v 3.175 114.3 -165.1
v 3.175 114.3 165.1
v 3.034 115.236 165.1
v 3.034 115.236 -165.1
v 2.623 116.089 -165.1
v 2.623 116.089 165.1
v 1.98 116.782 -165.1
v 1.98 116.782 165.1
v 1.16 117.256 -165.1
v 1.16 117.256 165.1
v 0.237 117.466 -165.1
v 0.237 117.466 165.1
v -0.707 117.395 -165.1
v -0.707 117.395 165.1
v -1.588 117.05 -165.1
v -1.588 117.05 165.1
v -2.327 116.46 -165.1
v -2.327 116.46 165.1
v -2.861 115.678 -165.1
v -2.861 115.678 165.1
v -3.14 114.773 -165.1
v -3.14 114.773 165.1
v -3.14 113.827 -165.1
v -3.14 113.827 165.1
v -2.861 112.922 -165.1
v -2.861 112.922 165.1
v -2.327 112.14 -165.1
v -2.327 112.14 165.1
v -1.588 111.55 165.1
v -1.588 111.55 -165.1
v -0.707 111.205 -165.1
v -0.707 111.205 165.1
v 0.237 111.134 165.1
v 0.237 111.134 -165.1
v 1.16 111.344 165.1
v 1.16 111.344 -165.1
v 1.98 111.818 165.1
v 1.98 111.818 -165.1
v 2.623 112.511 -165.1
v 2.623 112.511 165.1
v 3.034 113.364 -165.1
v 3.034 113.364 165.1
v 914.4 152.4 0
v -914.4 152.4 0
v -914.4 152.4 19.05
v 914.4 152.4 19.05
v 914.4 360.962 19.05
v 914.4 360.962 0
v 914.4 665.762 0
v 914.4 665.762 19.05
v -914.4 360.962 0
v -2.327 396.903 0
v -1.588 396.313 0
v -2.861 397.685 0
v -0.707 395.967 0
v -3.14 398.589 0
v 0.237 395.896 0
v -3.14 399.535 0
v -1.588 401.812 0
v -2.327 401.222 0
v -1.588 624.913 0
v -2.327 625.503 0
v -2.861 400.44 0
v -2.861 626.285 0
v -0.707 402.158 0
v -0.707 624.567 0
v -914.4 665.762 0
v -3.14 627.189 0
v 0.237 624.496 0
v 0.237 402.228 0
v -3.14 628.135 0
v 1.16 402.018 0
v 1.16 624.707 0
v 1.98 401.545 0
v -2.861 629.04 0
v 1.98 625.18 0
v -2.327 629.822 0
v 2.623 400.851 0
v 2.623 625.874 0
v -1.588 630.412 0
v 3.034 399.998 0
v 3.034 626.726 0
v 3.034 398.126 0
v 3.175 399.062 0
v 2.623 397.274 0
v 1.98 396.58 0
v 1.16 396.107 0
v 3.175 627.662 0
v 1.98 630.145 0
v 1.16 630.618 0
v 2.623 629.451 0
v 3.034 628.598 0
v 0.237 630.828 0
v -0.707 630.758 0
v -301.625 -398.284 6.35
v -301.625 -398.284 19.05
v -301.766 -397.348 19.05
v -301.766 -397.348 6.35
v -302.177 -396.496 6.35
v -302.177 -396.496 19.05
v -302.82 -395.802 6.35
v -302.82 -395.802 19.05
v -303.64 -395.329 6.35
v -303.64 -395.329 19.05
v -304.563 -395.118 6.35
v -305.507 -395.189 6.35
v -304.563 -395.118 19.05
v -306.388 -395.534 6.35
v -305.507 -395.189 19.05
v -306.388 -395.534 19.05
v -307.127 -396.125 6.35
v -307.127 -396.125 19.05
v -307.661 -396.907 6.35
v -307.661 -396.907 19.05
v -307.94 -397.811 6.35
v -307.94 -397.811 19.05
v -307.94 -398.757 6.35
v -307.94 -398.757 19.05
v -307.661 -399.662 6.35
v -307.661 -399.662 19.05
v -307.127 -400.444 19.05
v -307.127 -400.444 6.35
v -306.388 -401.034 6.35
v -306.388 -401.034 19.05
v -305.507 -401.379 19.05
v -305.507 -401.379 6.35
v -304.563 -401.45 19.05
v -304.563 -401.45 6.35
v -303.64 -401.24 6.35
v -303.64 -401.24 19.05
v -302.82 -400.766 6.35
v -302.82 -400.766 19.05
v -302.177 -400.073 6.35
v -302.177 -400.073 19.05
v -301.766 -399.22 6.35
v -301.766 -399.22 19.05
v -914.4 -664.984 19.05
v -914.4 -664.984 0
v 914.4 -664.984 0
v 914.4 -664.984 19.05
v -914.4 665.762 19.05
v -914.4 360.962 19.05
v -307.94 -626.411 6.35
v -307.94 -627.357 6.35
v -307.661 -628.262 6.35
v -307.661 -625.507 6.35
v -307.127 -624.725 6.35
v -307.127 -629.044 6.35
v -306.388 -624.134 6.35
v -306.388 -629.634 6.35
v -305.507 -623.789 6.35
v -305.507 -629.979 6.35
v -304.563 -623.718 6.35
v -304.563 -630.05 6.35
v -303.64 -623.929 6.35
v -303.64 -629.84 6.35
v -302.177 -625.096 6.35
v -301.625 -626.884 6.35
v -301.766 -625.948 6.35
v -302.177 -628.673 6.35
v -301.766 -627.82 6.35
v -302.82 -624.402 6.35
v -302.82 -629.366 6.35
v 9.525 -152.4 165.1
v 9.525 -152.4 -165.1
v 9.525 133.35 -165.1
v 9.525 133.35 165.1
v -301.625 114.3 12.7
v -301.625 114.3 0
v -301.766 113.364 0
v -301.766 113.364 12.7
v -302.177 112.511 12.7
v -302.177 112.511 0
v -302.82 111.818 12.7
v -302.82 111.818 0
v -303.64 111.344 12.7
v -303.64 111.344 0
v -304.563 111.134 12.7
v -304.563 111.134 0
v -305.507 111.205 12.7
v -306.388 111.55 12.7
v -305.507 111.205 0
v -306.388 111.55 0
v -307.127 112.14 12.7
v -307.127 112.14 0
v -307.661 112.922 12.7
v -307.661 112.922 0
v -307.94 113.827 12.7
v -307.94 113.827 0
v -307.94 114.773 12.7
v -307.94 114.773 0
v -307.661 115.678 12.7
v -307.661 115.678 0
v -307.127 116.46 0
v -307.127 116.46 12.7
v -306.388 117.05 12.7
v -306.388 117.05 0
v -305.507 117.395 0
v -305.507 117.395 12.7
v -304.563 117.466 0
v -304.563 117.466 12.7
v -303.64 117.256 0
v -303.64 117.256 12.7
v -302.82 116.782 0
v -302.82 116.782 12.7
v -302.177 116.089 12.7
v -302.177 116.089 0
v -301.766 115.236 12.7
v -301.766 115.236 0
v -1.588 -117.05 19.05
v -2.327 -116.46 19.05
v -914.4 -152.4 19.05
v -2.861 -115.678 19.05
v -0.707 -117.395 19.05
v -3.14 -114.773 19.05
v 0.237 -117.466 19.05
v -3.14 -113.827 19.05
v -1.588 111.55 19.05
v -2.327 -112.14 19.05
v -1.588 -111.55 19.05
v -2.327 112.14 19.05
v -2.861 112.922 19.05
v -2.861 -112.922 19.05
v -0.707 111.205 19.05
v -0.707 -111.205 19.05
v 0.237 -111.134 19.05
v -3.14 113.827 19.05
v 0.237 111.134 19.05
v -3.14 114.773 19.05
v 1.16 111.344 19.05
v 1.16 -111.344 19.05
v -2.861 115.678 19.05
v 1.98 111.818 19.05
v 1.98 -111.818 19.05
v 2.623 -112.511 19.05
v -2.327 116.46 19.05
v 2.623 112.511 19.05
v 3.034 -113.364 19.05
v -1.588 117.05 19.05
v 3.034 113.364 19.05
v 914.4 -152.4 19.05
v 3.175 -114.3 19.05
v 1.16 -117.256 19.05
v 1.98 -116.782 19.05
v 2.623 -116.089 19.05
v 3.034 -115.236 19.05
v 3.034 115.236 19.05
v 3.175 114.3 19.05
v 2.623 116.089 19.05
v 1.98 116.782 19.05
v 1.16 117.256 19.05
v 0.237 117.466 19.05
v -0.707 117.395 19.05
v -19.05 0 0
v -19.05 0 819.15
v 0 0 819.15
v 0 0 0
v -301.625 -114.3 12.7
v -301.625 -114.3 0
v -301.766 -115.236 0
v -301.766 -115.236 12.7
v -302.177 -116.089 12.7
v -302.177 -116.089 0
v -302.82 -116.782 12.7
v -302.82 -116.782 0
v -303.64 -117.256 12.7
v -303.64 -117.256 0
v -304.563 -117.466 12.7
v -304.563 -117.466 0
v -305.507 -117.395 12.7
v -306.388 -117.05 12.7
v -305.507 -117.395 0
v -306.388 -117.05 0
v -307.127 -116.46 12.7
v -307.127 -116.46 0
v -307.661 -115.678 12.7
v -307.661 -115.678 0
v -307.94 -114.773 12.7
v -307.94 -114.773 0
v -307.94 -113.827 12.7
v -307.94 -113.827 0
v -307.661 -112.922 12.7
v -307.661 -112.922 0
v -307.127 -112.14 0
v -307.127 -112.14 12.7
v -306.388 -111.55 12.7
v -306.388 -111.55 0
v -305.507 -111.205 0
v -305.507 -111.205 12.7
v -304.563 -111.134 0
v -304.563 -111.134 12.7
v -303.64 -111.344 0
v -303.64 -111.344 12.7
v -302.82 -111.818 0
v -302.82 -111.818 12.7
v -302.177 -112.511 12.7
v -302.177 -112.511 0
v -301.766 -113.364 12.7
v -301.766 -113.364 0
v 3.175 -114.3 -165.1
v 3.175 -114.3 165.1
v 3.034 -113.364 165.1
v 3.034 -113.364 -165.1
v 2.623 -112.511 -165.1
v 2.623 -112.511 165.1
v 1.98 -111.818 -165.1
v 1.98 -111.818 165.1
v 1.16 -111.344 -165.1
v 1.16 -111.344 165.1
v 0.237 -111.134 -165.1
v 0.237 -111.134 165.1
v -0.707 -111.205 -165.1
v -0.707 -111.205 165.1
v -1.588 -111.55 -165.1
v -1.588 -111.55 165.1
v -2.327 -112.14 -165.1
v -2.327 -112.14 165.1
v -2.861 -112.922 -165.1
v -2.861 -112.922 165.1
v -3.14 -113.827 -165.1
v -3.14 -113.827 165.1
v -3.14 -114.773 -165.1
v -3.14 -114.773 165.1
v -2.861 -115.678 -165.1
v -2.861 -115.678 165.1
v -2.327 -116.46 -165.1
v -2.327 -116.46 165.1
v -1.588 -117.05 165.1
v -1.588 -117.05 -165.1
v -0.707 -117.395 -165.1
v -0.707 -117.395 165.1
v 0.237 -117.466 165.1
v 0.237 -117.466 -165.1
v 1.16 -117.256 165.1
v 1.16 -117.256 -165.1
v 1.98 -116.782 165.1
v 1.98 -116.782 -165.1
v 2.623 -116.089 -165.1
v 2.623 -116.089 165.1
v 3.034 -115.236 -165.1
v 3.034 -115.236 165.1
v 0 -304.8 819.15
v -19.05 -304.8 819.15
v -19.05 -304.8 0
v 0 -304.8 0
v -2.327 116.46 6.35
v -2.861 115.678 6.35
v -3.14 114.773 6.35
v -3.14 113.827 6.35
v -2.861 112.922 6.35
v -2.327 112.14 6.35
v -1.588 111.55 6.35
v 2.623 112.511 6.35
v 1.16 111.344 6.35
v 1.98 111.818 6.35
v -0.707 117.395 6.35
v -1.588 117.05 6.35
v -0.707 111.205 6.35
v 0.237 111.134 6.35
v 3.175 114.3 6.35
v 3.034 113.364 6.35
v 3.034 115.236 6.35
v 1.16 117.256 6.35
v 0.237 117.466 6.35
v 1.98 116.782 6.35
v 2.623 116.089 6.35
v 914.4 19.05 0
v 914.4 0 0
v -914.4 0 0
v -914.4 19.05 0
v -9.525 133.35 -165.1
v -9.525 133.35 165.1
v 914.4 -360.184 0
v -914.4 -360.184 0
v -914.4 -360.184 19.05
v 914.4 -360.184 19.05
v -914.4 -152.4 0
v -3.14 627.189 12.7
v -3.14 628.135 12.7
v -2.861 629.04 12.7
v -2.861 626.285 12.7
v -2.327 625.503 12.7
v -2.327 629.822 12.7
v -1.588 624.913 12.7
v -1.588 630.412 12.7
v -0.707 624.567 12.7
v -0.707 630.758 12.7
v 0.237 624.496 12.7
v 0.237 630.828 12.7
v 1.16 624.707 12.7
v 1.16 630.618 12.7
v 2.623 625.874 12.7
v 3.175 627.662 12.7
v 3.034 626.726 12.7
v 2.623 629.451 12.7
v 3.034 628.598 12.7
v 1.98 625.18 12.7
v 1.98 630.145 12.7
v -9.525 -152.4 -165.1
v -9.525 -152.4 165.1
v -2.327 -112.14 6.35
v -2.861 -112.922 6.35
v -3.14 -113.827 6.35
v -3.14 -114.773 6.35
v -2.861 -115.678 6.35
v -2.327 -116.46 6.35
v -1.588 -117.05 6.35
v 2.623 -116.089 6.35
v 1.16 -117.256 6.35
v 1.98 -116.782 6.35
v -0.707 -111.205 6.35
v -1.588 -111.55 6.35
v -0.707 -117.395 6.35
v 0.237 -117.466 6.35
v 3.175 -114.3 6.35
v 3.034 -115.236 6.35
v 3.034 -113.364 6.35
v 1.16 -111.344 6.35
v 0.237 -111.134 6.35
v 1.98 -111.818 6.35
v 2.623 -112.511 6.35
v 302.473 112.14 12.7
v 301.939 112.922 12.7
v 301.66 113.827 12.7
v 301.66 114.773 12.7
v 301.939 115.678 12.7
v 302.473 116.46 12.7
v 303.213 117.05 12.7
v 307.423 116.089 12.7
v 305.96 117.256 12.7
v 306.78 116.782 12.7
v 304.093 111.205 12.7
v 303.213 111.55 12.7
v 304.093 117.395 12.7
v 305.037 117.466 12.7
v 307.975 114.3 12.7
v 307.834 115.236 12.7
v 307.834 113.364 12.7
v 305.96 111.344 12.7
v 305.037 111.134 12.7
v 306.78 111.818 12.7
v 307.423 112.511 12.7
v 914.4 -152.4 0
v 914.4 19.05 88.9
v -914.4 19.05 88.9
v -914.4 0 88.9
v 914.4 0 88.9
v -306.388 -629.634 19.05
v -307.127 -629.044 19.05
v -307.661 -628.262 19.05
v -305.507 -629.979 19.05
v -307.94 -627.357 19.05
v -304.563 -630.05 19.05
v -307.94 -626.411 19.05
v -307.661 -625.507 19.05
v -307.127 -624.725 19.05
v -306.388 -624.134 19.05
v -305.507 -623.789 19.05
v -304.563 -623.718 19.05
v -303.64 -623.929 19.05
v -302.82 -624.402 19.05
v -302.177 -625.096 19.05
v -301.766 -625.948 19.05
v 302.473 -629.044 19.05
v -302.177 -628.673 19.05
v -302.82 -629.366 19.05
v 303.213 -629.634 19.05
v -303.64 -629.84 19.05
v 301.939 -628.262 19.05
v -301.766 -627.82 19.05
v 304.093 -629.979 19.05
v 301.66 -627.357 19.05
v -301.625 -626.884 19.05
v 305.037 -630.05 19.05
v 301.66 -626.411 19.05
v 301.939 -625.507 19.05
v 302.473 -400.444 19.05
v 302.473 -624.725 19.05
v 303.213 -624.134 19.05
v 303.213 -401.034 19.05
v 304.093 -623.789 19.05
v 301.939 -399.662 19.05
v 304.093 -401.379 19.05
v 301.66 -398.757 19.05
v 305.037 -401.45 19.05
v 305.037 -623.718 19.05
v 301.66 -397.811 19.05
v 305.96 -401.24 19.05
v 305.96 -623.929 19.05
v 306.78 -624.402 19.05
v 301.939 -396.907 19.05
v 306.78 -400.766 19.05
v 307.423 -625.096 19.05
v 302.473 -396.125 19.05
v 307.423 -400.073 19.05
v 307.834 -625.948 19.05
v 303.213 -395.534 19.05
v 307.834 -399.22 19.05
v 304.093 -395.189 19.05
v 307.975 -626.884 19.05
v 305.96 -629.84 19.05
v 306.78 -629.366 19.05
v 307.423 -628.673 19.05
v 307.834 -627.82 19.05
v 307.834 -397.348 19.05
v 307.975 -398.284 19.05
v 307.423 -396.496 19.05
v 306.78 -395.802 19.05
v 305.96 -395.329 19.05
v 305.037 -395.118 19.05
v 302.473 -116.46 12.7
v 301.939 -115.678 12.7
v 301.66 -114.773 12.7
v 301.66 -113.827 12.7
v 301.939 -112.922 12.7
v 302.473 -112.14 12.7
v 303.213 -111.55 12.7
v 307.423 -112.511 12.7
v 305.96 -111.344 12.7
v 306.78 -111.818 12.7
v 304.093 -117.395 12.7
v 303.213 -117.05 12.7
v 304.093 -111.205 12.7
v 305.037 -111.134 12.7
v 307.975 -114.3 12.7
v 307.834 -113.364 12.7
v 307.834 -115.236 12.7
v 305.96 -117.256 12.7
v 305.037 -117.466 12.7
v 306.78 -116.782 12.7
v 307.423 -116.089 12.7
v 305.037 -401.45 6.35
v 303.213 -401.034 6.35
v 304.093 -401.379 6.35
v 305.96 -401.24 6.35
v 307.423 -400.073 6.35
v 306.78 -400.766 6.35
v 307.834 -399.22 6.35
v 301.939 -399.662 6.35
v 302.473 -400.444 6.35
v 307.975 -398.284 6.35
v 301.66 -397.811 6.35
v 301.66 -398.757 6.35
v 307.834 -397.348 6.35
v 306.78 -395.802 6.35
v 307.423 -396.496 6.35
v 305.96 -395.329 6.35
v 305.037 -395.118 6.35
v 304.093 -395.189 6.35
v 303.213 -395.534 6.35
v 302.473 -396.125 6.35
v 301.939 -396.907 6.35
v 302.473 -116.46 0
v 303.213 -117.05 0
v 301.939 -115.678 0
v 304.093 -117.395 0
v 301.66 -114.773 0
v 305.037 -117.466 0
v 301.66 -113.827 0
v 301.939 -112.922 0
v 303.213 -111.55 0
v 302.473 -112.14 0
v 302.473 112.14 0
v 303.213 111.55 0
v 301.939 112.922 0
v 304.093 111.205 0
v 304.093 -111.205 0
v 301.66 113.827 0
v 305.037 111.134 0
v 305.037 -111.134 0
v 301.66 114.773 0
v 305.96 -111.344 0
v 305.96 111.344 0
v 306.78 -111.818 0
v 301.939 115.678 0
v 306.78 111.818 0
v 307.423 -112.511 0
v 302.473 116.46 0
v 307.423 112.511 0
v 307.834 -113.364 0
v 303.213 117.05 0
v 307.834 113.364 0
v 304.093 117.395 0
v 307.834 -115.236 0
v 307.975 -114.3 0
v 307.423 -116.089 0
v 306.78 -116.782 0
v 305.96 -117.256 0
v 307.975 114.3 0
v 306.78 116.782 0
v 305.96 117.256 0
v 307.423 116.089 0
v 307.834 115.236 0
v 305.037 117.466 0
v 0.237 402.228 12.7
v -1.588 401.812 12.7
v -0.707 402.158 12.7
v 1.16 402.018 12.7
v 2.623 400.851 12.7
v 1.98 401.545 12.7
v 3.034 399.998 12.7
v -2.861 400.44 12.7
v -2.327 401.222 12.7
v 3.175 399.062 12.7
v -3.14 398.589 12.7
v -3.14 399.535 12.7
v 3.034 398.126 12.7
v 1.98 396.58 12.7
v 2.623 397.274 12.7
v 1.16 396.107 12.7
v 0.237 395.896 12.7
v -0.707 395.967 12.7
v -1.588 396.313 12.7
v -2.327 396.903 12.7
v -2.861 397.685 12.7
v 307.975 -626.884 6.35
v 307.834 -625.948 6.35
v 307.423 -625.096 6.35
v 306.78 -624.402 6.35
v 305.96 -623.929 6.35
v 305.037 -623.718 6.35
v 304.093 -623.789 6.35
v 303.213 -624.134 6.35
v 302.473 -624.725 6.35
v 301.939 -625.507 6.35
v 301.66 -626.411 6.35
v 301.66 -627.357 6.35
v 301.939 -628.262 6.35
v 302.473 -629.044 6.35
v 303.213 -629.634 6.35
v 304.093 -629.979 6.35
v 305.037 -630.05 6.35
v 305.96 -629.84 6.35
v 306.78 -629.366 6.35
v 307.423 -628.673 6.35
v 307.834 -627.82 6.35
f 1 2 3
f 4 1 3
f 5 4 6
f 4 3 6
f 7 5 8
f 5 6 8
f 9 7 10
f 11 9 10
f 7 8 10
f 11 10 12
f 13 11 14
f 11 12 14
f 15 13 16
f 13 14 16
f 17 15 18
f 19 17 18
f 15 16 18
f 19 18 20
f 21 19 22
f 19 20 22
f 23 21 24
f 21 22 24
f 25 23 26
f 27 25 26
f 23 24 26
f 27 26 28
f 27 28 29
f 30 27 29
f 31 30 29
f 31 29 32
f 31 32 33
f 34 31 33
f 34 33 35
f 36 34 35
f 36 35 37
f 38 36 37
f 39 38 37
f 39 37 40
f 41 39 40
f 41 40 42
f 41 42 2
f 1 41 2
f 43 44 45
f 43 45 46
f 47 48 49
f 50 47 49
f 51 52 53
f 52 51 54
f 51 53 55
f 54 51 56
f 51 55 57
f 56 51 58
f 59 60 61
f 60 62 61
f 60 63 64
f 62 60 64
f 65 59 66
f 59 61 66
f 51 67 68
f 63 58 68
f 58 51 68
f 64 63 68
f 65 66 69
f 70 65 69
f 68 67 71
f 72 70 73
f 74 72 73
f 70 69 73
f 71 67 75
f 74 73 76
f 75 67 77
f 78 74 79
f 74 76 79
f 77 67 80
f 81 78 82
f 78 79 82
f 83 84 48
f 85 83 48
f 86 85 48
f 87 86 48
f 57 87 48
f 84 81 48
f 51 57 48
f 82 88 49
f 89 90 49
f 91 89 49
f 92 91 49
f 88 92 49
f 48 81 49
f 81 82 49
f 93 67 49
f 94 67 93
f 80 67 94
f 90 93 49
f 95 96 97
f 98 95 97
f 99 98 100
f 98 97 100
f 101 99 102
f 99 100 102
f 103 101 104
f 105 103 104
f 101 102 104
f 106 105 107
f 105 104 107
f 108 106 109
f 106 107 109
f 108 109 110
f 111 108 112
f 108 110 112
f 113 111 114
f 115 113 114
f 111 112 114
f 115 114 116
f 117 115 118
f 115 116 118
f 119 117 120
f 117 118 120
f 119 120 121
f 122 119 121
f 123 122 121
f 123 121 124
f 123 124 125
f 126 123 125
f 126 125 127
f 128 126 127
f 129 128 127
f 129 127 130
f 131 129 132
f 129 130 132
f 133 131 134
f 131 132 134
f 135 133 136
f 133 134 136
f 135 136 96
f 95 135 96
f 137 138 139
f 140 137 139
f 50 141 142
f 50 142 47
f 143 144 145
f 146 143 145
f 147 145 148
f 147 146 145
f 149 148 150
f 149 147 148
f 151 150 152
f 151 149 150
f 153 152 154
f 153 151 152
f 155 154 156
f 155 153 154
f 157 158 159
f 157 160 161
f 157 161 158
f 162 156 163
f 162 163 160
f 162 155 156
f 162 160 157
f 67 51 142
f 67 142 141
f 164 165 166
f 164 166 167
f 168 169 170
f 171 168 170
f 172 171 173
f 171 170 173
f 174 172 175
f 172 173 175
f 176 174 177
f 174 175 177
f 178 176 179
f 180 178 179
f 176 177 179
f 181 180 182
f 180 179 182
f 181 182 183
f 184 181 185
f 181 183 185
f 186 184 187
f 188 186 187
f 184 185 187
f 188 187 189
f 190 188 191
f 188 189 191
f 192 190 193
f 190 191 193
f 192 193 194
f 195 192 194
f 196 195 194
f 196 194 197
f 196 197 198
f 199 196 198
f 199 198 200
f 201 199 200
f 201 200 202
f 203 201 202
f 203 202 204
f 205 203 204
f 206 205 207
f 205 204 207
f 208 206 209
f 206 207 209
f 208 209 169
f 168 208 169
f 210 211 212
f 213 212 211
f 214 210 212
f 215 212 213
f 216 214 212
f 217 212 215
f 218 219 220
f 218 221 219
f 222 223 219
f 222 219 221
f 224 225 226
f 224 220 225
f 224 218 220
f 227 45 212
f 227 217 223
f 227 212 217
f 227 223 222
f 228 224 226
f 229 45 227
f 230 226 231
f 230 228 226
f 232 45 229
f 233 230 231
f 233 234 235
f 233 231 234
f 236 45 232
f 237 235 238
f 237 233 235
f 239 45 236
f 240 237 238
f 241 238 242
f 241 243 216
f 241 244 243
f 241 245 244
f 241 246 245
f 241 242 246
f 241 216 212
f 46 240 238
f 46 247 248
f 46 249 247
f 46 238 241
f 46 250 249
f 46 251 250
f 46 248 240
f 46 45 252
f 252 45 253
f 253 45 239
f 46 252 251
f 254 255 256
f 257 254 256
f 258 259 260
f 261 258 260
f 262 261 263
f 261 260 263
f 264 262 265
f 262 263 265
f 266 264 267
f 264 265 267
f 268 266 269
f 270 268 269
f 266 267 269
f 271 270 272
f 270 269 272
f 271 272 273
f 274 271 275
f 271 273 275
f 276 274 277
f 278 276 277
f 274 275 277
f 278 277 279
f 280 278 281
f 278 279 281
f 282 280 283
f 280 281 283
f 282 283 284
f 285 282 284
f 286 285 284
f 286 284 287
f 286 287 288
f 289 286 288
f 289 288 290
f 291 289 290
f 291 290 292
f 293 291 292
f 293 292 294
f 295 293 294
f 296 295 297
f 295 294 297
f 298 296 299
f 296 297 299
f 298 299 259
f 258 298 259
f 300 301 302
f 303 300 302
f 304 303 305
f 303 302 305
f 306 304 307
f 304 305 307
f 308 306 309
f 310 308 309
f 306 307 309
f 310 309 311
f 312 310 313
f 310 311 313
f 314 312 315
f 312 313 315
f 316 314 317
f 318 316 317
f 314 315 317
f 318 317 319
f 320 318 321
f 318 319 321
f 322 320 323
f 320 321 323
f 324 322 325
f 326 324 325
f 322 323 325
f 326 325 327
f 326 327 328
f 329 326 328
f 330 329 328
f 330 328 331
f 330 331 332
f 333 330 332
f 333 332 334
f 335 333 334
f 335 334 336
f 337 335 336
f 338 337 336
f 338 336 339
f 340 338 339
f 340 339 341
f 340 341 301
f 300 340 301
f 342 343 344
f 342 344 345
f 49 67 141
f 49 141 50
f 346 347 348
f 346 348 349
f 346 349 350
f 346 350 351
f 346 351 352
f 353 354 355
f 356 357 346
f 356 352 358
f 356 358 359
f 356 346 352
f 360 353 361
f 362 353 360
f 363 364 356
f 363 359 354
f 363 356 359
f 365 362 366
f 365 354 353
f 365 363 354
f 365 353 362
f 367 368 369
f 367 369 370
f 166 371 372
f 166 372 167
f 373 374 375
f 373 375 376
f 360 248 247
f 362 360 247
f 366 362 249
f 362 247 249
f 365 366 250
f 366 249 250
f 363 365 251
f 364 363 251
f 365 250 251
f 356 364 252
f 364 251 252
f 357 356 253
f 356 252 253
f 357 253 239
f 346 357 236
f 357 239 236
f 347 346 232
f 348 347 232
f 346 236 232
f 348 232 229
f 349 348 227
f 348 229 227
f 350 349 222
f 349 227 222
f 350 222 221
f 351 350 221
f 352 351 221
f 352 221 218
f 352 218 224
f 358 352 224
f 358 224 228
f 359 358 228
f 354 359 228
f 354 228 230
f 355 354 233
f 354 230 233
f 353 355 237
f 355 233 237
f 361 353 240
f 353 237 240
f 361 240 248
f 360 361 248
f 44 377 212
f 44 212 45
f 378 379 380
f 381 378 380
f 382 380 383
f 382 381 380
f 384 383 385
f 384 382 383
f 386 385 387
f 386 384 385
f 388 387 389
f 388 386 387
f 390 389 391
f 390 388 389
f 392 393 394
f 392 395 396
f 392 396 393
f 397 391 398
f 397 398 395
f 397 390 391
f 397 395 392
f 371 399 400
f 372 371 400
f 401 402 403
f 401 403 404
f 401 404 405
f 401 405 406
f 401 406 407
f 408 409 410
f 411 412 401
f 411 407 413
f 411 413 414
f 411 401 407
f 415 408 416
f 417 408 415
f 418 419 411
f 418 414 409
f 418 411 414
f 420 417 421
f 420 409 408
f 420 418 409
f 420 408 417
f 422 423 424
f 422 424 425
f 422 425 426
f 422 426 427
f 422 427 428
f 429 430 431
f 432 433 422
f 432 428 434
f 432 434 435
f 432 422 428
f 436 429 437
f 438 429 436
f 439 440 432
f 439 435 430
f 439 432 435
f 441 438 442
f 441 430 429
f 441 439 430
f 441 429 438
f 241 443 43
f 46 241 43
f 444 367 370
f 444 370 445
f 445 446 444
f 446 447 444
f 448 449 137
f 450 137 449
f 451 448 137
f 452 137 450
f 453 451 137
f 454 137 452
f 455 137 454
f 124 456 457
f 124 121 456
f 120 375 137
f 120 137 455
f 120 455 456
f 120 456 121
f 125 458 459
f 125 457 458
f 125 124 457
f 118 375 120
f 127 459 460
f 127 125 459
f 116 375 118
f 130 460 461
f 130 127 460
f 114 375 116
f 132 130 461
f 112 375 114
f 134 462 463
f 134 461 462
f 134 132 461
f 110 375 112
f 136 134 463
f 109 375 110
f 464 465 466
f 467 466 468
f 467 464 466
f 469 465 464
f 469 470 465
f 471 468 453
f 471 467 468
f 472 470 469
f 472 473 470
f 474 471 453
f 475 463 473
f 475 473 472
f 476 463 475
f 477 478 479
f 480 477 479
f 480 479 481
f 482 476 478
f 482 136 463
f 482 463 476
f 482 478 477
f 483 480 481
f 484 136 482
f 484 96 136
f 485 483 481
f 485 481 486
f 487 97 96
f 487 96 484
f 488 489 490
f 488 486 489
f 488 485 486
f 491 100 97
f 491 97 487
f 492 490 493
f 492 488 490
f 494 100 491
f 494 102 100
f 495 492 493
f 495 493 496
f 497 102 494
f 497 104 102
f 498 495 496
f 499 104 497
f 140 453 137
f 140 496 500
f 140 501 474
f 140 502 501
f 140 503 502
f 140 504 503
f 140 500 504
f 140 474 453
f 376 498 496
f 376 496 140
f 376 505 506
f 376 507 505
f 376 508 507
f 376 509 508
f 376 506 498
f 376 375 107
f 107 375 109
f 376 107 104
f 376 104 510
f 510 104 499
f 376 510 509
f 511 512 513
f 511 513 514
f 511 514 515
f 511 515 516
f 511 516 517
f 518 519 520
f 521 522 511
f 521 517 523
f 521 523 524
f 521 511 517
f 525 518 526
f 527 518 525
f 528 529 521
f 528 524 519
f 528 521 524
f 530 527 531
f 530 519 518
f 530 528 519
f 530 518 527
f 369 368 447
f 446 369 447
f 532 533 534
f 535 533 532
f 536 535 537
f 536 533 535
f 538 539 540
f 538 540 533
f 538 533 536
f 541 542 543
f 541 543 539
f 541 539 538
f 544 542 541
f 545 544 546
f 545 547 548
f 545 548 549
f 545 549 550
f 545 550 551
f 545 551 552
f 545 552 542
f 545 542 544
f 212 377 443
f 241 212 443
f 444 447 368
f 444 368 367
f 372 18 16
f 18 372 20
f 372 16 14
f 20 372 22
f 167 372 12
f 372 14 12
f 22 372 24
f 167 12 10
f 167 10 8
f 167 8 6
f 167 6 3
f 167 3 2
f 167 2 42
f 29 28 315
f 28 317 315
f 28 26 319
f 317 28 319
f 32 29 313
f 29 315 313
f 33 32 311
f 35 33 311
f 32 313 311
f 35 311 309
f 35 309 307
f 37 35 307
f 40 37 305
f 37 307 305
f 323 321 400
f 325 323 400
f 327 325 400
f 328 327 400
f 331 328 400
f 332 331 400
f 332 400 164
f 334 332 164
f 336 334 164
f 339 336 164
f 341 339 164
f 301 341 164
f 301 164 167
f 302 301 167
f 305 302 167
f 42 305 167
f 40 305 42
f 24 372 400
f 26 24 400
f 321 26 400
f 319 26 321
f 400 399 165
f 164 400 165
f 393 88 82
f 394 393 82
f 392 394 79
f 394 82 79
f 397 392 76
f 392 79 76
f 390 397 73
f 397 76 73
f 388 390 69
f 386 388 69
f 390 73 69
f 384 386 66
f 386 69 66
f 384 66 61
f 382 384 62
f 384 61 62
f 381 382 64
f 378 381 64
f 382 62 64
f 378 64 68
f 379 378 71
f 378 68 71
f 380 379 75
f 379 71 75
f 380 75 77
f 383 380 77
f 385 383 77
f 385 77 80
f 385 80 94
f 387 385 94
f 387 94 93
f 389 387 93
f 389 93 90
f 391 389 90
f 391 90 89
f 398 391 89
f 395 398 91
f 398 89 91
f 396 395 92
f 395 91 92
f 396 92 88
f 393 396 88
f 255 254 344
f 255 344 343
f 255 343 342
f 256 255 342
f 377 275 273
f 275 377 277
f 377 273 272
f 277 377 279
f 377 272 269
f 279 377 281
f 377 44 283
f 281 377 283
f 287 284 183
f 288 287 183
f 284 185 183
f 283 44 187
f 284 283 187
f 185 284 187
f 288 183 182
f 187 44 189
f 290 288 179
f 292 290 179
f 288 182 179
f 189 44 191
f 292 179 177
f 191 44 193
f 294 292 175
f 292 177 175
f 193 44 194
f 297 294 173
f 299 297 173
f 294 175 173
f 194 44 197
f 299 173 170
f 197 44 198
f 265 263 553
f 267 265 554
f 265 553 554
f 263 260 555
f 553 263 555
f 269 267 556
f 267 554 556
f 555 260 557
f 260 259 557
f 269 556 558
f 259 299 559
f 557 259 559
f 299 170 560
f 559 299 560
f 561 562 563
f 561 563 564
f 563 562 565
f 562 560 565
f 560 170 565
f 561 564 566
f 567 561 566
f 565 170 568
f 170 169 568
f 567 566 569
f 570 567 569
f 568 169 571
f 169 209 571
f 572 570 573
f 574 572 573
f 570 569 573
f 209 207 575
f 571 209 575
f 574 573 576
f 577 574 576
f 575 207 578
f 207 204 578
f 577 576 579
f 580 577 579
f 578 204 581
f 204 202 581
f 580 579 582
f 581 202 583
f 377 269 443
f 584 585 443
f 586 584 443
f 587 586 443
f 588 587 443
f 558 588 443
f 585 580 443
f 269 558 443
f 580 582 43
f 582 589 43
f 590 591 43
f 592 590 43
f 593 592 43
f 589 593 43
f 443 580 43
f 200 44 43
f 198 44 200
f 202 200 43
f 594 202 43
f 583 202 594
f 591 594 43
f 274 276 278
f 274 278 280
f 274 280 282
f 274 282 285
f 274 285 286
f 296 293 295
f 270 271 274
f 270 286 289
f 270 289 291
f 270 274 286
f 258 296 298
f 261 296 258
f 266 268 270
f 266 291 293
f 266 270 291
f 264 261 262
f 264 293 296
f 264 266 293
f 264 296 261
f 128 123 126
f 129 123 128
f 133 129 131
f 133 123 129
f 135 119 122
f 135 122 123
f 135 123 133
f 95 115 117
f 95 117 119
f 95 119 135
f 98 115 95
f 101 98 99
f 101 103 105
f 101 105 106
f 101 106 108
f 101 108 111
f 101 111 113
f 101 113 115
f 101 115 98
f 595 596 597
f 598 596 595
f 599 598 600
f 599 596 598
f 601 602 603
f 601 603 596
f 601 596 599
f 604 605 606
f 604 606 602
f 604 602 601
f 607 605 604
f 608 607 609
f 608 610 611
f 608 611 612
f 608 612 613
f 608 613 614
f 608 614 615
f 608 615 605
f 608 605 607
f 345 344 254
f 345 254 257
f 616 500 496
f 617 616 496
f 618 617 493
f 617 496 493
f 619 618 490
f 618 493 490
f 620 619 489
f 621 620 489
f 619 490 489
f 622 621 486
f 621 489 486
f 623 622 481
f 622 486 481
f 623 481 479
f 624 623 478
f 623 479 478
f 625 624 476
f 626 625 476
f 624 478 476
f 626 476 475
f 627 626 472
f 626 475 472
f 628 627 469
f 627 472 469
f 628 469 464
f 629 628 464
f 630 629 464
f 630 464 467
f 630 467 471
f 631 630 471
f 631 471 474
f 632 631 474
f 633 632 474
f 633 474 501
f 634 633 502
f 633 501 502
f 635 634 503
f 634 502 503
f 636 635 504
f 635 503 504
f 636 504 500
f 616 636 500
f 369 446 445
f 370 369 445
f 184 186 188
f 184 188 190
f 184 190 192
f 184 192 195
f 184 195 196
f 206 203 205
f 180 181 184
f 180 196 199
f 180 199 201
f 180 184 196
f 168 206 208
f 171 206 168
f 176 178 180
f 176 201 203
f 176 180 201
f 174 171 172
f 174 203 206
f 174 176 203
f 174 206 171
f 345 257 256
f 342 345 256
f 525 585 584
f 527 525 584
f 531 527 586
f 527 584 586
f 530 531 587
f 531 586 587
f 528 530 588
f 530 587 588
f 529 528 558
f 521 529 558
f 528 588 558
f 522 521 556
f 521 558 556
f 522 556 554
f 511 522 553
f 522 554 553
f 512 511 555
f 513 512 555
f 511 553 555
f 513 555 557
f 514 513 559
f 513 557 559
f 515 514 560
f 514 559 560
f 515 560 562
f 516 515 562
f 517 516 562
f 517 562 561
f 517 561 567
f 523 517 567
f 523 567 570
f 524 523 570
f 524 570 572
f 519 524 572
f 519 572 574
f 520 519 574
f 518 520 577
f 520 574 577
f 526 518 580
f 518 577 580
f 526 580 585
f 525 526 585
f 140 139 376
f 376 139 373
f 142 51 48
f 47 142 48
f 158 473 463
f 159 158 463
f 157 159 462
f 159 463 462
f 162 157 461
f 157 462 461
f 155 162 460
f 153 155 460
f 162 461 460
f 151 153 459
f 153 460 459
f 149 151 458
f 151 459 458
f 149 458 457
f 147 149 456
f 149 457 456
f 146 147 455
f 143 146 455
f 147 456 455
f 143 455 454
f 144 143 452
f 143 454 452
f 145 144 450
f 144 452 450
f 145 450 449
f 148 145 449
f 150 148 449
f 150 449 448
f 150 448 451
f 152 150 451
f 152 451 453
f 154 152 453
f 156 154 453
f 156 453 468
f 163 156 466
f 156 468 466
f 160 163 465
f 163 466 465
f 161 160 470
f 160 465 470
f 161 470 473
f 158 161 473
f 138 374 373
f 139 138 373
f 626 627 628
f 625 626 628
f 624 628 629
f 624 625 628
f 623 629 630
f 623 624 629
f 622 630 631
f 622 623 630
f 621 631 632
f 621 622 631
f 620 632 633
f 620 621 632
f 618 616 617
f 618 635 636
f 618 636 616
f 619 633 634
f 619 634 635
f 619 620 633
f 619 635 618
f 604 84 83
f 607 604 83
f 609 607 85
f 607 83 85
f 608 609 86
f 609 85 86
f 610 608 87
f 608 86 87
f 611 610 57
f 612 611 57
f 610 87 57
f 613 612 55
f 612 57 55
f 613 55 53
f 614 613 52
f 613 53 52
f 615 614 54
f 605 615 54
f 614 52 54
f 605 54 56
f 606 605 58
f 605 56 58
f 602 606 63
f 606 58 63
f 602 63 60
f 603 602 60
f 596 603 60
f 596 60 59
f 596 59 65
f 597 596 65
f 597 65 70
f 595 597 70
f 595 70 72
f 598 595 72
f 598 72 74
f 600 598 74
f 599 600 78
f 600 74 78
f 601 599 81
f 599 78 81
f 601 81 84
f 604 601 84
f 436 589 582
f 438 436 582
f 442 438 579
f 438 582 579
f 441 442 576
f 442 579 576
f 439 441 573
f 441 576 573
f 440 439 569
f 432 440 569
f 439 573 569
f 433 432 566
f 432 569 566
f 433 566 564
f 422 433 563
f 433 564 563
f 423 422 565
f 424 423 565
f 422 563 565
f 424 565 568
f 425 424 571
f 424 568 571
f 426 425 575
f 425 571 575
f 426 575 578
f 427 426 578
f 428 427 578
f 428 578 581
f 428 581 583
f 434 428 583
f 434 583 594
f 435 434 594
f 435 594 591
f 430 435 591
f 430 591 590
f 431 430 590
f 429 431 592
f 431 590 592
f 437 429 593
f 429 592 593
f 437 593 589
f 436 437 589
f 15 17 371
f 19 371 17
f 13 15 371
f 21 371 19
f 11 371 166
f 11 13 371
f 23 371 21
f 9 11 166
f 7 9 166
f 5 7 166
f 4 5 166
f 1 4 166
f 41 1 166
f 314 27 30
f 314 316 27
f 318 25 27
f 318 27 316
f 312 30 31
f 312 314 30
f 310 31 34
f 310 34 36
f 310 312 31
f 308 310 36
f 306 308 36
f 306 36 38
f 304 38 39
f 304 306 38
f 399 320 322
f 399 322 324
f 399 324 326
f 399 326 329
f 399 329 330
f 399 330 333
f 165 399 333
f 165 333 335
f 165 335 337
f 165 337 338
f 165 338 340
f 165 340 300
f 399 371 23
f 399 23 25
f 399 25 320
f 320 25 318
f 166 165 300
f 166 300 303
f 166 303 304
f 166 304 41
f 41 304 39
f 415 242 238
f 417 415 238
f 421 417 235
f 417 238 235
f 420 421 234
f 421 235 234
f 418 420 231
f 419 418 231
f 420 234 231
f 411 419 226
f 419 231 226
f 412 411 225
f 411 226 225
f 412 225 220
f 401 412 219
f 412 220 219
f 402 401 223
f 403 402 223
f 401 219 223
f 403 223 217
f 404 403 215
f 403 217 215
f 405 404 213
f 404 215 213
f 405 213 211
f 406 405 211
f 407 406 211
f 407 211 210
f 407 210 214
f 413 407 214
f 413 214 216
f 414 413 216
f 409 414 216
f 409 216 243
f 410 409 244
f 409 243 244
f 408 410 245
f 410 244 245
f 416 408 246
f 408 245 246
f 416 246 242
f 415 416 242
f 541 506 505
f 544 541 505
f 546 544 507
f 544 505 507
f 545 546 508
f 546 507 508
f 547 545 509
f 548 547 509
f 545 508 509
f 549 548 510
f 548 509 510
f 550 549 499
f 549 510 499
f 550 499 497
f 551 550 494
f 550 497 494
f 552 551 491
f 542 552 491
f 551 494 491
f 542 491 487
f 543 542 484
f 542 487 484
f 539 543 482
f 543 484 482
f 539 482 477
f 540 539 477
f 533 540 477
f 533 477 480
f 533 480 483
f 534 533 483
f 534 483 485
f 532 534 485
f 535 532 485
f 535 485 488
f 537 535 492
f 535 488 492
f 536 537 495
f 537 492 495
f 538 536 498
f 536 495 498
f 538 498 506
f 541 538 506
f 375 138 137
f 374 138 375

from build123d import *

# Parameters (mm, degrees)
F0_W          = 1828.8
F0_H          = 304.8
F1_DEPTH      = 19.05
F2_R          = 3.175
F3_DEPTH      = 12.7
F4_W          = 19.05
F4_H          = 819.15
F5_DEPTH      = 304.8
F6_W          = 19.05
F6_H          = 330.2
F7_DEPTH      = 152.4
F7_DEPTH_BACK = 133.35
F8_R          = 3.175
F9_DEPTH      = 330.201
F10_R         = 3.175
F11_DEPTH     = 12.7
F12_W         = 19.05
F12_H         = 88.9
F13_DEPTH     = 914.4


with BuildPart() as f1:
    # F0 (on Top) → F1 (new body)
    with BuildSketch(Plane.XY):
        with Locations((0, -512.5841030306)):
            Rectangle(F0_W, F0_H)
    extrude(amount=F1_DEPTH)


with BuildPart() as f1b:
    # F0 (on Top) → F1, piece 2 (new body)
    with BuildSketch(Plane.XY):
        Rectangle(F0_W, F0_H)
    extrude(amount=F1_DEPTH)


with BuildPart() as f1c:
    # F0 (on Top) → F1, piece 3 (new body)
    with BuildSketch(Plane.XY):
        with Locations((0, 513.3622078247)):
            Rectangle(F0_W, F0_H)
    extrude(amount=F1_DEPTH)


with BuildPart() as f3_tool:
    # F2 (on face) → F3 (new body)
    with BuildSketch(Plane.XY.offset(19.05)):
        with Locations((0, 114.3)):
            Circle(F2_R)
        with Locations((0, -114.3)):
            Circle(F2_R)
        with Locations((-304.8, -398.2841030306)):
            Circle(F2_R)
        with Locations((-304.8, -626.8841030306)):
            Circle(F2_R)
        with Locations((304.8, -626.8841030306)):
            Circle(F2_R)
        with Locations((304.8, -398.2841030306)):
            Circle(F2_R)
    extrude(amount=-F3_DEPTH)


with BuildPart() as f1_1:
    add(f1.part)

    # F3: cut by f3_tool
    add(f3_tool.part, mode=Mode.SUBTRACT)


with BuildPart() as f1b_1:
    add(f1b.part)

    # F3: cut by f3_tool
    add(f3_tool.part, mode=Mode.SUBTRACT)


with BuildPart() as f5:
    # F4 (on Front) → F5 (new body)
    with BuildSketch(Plane.XZ):
        with Locations((-9.525, 409.575)):
            Rectangle(F4_W, F4_H)
    extrude(amount=F5_DEPTH)


with BuildPart() as f7:
    # F6 (on Front) → F7 (new body, two sides)
    with BuildSketch(Plane.XZ) as f7_sk:
        Rectangle(F6_W, F6_H)
    extrude(amount=F7_DEPTH)
    extrude(f7_sk.sketch, amount=-F7_DEPTH_BACK)

    # F8 (on face) → F9 (cut, through all)
    with BuildSketch(Plane.XY.offset(165.1)):
        with Locations((0, 114.3)):
            Circle(F8_R)
        with Locations((0, -114.3)):
            Circle(F8_R)
    extrude(amount=-F9_DEPTH, mode=Mode.SUBTRACT)


with BuildPart() as f11_tool:
    # F10 (on face) → F11 (new body)
    with BuildSketch(Plane(origin=(0, 0, 0), x_dir=(1, 0, 0), z_dir=(0, 0, -1))):
        with Locations((-304.8, 114.3)):
            Circle(F10_R)
        with Locations((-304.8, -114.3)):
            Circle(F10_R)
        with Locations((304.8, -114.3)):
            Circle(F10_R)
        with Locations((304.8, 114.3)):
            Circle(F10_R)
        with Locations((0, -399.0622078247)):
            Circle(F10_R)
        with Locations((0, -627.6622078247)):
            Circle(F10_R)
    extrude(amount=-F11_DEPTH)


with BuildPart() as f1b_2:
    add(f1b_1.part)

    # F11: cut by f11_tool
    add(f11_tool.part, mode=Mode.SUBTRACT)


with BuildPart() as f1c_1:
    add(f1c.part)

    # F11: cut by f11_tool
    add(f11_tool.part, mode=Mode.SUBTRACT)


with BuildPart() as f13:
    # F12 (on Right) → F13 (new body, symmetric)
    with BuildSketch(Plane.YZ):
        with Locations((9.525, 44.45)):
            Rectangle(F12_W, F12_H)
    extrude(amount=F13_DEPTH, both=True)


solid = Compound([f1_1.part, f5.part, f7.part, f1b_2.part, f1c_1.part, f13.part])
